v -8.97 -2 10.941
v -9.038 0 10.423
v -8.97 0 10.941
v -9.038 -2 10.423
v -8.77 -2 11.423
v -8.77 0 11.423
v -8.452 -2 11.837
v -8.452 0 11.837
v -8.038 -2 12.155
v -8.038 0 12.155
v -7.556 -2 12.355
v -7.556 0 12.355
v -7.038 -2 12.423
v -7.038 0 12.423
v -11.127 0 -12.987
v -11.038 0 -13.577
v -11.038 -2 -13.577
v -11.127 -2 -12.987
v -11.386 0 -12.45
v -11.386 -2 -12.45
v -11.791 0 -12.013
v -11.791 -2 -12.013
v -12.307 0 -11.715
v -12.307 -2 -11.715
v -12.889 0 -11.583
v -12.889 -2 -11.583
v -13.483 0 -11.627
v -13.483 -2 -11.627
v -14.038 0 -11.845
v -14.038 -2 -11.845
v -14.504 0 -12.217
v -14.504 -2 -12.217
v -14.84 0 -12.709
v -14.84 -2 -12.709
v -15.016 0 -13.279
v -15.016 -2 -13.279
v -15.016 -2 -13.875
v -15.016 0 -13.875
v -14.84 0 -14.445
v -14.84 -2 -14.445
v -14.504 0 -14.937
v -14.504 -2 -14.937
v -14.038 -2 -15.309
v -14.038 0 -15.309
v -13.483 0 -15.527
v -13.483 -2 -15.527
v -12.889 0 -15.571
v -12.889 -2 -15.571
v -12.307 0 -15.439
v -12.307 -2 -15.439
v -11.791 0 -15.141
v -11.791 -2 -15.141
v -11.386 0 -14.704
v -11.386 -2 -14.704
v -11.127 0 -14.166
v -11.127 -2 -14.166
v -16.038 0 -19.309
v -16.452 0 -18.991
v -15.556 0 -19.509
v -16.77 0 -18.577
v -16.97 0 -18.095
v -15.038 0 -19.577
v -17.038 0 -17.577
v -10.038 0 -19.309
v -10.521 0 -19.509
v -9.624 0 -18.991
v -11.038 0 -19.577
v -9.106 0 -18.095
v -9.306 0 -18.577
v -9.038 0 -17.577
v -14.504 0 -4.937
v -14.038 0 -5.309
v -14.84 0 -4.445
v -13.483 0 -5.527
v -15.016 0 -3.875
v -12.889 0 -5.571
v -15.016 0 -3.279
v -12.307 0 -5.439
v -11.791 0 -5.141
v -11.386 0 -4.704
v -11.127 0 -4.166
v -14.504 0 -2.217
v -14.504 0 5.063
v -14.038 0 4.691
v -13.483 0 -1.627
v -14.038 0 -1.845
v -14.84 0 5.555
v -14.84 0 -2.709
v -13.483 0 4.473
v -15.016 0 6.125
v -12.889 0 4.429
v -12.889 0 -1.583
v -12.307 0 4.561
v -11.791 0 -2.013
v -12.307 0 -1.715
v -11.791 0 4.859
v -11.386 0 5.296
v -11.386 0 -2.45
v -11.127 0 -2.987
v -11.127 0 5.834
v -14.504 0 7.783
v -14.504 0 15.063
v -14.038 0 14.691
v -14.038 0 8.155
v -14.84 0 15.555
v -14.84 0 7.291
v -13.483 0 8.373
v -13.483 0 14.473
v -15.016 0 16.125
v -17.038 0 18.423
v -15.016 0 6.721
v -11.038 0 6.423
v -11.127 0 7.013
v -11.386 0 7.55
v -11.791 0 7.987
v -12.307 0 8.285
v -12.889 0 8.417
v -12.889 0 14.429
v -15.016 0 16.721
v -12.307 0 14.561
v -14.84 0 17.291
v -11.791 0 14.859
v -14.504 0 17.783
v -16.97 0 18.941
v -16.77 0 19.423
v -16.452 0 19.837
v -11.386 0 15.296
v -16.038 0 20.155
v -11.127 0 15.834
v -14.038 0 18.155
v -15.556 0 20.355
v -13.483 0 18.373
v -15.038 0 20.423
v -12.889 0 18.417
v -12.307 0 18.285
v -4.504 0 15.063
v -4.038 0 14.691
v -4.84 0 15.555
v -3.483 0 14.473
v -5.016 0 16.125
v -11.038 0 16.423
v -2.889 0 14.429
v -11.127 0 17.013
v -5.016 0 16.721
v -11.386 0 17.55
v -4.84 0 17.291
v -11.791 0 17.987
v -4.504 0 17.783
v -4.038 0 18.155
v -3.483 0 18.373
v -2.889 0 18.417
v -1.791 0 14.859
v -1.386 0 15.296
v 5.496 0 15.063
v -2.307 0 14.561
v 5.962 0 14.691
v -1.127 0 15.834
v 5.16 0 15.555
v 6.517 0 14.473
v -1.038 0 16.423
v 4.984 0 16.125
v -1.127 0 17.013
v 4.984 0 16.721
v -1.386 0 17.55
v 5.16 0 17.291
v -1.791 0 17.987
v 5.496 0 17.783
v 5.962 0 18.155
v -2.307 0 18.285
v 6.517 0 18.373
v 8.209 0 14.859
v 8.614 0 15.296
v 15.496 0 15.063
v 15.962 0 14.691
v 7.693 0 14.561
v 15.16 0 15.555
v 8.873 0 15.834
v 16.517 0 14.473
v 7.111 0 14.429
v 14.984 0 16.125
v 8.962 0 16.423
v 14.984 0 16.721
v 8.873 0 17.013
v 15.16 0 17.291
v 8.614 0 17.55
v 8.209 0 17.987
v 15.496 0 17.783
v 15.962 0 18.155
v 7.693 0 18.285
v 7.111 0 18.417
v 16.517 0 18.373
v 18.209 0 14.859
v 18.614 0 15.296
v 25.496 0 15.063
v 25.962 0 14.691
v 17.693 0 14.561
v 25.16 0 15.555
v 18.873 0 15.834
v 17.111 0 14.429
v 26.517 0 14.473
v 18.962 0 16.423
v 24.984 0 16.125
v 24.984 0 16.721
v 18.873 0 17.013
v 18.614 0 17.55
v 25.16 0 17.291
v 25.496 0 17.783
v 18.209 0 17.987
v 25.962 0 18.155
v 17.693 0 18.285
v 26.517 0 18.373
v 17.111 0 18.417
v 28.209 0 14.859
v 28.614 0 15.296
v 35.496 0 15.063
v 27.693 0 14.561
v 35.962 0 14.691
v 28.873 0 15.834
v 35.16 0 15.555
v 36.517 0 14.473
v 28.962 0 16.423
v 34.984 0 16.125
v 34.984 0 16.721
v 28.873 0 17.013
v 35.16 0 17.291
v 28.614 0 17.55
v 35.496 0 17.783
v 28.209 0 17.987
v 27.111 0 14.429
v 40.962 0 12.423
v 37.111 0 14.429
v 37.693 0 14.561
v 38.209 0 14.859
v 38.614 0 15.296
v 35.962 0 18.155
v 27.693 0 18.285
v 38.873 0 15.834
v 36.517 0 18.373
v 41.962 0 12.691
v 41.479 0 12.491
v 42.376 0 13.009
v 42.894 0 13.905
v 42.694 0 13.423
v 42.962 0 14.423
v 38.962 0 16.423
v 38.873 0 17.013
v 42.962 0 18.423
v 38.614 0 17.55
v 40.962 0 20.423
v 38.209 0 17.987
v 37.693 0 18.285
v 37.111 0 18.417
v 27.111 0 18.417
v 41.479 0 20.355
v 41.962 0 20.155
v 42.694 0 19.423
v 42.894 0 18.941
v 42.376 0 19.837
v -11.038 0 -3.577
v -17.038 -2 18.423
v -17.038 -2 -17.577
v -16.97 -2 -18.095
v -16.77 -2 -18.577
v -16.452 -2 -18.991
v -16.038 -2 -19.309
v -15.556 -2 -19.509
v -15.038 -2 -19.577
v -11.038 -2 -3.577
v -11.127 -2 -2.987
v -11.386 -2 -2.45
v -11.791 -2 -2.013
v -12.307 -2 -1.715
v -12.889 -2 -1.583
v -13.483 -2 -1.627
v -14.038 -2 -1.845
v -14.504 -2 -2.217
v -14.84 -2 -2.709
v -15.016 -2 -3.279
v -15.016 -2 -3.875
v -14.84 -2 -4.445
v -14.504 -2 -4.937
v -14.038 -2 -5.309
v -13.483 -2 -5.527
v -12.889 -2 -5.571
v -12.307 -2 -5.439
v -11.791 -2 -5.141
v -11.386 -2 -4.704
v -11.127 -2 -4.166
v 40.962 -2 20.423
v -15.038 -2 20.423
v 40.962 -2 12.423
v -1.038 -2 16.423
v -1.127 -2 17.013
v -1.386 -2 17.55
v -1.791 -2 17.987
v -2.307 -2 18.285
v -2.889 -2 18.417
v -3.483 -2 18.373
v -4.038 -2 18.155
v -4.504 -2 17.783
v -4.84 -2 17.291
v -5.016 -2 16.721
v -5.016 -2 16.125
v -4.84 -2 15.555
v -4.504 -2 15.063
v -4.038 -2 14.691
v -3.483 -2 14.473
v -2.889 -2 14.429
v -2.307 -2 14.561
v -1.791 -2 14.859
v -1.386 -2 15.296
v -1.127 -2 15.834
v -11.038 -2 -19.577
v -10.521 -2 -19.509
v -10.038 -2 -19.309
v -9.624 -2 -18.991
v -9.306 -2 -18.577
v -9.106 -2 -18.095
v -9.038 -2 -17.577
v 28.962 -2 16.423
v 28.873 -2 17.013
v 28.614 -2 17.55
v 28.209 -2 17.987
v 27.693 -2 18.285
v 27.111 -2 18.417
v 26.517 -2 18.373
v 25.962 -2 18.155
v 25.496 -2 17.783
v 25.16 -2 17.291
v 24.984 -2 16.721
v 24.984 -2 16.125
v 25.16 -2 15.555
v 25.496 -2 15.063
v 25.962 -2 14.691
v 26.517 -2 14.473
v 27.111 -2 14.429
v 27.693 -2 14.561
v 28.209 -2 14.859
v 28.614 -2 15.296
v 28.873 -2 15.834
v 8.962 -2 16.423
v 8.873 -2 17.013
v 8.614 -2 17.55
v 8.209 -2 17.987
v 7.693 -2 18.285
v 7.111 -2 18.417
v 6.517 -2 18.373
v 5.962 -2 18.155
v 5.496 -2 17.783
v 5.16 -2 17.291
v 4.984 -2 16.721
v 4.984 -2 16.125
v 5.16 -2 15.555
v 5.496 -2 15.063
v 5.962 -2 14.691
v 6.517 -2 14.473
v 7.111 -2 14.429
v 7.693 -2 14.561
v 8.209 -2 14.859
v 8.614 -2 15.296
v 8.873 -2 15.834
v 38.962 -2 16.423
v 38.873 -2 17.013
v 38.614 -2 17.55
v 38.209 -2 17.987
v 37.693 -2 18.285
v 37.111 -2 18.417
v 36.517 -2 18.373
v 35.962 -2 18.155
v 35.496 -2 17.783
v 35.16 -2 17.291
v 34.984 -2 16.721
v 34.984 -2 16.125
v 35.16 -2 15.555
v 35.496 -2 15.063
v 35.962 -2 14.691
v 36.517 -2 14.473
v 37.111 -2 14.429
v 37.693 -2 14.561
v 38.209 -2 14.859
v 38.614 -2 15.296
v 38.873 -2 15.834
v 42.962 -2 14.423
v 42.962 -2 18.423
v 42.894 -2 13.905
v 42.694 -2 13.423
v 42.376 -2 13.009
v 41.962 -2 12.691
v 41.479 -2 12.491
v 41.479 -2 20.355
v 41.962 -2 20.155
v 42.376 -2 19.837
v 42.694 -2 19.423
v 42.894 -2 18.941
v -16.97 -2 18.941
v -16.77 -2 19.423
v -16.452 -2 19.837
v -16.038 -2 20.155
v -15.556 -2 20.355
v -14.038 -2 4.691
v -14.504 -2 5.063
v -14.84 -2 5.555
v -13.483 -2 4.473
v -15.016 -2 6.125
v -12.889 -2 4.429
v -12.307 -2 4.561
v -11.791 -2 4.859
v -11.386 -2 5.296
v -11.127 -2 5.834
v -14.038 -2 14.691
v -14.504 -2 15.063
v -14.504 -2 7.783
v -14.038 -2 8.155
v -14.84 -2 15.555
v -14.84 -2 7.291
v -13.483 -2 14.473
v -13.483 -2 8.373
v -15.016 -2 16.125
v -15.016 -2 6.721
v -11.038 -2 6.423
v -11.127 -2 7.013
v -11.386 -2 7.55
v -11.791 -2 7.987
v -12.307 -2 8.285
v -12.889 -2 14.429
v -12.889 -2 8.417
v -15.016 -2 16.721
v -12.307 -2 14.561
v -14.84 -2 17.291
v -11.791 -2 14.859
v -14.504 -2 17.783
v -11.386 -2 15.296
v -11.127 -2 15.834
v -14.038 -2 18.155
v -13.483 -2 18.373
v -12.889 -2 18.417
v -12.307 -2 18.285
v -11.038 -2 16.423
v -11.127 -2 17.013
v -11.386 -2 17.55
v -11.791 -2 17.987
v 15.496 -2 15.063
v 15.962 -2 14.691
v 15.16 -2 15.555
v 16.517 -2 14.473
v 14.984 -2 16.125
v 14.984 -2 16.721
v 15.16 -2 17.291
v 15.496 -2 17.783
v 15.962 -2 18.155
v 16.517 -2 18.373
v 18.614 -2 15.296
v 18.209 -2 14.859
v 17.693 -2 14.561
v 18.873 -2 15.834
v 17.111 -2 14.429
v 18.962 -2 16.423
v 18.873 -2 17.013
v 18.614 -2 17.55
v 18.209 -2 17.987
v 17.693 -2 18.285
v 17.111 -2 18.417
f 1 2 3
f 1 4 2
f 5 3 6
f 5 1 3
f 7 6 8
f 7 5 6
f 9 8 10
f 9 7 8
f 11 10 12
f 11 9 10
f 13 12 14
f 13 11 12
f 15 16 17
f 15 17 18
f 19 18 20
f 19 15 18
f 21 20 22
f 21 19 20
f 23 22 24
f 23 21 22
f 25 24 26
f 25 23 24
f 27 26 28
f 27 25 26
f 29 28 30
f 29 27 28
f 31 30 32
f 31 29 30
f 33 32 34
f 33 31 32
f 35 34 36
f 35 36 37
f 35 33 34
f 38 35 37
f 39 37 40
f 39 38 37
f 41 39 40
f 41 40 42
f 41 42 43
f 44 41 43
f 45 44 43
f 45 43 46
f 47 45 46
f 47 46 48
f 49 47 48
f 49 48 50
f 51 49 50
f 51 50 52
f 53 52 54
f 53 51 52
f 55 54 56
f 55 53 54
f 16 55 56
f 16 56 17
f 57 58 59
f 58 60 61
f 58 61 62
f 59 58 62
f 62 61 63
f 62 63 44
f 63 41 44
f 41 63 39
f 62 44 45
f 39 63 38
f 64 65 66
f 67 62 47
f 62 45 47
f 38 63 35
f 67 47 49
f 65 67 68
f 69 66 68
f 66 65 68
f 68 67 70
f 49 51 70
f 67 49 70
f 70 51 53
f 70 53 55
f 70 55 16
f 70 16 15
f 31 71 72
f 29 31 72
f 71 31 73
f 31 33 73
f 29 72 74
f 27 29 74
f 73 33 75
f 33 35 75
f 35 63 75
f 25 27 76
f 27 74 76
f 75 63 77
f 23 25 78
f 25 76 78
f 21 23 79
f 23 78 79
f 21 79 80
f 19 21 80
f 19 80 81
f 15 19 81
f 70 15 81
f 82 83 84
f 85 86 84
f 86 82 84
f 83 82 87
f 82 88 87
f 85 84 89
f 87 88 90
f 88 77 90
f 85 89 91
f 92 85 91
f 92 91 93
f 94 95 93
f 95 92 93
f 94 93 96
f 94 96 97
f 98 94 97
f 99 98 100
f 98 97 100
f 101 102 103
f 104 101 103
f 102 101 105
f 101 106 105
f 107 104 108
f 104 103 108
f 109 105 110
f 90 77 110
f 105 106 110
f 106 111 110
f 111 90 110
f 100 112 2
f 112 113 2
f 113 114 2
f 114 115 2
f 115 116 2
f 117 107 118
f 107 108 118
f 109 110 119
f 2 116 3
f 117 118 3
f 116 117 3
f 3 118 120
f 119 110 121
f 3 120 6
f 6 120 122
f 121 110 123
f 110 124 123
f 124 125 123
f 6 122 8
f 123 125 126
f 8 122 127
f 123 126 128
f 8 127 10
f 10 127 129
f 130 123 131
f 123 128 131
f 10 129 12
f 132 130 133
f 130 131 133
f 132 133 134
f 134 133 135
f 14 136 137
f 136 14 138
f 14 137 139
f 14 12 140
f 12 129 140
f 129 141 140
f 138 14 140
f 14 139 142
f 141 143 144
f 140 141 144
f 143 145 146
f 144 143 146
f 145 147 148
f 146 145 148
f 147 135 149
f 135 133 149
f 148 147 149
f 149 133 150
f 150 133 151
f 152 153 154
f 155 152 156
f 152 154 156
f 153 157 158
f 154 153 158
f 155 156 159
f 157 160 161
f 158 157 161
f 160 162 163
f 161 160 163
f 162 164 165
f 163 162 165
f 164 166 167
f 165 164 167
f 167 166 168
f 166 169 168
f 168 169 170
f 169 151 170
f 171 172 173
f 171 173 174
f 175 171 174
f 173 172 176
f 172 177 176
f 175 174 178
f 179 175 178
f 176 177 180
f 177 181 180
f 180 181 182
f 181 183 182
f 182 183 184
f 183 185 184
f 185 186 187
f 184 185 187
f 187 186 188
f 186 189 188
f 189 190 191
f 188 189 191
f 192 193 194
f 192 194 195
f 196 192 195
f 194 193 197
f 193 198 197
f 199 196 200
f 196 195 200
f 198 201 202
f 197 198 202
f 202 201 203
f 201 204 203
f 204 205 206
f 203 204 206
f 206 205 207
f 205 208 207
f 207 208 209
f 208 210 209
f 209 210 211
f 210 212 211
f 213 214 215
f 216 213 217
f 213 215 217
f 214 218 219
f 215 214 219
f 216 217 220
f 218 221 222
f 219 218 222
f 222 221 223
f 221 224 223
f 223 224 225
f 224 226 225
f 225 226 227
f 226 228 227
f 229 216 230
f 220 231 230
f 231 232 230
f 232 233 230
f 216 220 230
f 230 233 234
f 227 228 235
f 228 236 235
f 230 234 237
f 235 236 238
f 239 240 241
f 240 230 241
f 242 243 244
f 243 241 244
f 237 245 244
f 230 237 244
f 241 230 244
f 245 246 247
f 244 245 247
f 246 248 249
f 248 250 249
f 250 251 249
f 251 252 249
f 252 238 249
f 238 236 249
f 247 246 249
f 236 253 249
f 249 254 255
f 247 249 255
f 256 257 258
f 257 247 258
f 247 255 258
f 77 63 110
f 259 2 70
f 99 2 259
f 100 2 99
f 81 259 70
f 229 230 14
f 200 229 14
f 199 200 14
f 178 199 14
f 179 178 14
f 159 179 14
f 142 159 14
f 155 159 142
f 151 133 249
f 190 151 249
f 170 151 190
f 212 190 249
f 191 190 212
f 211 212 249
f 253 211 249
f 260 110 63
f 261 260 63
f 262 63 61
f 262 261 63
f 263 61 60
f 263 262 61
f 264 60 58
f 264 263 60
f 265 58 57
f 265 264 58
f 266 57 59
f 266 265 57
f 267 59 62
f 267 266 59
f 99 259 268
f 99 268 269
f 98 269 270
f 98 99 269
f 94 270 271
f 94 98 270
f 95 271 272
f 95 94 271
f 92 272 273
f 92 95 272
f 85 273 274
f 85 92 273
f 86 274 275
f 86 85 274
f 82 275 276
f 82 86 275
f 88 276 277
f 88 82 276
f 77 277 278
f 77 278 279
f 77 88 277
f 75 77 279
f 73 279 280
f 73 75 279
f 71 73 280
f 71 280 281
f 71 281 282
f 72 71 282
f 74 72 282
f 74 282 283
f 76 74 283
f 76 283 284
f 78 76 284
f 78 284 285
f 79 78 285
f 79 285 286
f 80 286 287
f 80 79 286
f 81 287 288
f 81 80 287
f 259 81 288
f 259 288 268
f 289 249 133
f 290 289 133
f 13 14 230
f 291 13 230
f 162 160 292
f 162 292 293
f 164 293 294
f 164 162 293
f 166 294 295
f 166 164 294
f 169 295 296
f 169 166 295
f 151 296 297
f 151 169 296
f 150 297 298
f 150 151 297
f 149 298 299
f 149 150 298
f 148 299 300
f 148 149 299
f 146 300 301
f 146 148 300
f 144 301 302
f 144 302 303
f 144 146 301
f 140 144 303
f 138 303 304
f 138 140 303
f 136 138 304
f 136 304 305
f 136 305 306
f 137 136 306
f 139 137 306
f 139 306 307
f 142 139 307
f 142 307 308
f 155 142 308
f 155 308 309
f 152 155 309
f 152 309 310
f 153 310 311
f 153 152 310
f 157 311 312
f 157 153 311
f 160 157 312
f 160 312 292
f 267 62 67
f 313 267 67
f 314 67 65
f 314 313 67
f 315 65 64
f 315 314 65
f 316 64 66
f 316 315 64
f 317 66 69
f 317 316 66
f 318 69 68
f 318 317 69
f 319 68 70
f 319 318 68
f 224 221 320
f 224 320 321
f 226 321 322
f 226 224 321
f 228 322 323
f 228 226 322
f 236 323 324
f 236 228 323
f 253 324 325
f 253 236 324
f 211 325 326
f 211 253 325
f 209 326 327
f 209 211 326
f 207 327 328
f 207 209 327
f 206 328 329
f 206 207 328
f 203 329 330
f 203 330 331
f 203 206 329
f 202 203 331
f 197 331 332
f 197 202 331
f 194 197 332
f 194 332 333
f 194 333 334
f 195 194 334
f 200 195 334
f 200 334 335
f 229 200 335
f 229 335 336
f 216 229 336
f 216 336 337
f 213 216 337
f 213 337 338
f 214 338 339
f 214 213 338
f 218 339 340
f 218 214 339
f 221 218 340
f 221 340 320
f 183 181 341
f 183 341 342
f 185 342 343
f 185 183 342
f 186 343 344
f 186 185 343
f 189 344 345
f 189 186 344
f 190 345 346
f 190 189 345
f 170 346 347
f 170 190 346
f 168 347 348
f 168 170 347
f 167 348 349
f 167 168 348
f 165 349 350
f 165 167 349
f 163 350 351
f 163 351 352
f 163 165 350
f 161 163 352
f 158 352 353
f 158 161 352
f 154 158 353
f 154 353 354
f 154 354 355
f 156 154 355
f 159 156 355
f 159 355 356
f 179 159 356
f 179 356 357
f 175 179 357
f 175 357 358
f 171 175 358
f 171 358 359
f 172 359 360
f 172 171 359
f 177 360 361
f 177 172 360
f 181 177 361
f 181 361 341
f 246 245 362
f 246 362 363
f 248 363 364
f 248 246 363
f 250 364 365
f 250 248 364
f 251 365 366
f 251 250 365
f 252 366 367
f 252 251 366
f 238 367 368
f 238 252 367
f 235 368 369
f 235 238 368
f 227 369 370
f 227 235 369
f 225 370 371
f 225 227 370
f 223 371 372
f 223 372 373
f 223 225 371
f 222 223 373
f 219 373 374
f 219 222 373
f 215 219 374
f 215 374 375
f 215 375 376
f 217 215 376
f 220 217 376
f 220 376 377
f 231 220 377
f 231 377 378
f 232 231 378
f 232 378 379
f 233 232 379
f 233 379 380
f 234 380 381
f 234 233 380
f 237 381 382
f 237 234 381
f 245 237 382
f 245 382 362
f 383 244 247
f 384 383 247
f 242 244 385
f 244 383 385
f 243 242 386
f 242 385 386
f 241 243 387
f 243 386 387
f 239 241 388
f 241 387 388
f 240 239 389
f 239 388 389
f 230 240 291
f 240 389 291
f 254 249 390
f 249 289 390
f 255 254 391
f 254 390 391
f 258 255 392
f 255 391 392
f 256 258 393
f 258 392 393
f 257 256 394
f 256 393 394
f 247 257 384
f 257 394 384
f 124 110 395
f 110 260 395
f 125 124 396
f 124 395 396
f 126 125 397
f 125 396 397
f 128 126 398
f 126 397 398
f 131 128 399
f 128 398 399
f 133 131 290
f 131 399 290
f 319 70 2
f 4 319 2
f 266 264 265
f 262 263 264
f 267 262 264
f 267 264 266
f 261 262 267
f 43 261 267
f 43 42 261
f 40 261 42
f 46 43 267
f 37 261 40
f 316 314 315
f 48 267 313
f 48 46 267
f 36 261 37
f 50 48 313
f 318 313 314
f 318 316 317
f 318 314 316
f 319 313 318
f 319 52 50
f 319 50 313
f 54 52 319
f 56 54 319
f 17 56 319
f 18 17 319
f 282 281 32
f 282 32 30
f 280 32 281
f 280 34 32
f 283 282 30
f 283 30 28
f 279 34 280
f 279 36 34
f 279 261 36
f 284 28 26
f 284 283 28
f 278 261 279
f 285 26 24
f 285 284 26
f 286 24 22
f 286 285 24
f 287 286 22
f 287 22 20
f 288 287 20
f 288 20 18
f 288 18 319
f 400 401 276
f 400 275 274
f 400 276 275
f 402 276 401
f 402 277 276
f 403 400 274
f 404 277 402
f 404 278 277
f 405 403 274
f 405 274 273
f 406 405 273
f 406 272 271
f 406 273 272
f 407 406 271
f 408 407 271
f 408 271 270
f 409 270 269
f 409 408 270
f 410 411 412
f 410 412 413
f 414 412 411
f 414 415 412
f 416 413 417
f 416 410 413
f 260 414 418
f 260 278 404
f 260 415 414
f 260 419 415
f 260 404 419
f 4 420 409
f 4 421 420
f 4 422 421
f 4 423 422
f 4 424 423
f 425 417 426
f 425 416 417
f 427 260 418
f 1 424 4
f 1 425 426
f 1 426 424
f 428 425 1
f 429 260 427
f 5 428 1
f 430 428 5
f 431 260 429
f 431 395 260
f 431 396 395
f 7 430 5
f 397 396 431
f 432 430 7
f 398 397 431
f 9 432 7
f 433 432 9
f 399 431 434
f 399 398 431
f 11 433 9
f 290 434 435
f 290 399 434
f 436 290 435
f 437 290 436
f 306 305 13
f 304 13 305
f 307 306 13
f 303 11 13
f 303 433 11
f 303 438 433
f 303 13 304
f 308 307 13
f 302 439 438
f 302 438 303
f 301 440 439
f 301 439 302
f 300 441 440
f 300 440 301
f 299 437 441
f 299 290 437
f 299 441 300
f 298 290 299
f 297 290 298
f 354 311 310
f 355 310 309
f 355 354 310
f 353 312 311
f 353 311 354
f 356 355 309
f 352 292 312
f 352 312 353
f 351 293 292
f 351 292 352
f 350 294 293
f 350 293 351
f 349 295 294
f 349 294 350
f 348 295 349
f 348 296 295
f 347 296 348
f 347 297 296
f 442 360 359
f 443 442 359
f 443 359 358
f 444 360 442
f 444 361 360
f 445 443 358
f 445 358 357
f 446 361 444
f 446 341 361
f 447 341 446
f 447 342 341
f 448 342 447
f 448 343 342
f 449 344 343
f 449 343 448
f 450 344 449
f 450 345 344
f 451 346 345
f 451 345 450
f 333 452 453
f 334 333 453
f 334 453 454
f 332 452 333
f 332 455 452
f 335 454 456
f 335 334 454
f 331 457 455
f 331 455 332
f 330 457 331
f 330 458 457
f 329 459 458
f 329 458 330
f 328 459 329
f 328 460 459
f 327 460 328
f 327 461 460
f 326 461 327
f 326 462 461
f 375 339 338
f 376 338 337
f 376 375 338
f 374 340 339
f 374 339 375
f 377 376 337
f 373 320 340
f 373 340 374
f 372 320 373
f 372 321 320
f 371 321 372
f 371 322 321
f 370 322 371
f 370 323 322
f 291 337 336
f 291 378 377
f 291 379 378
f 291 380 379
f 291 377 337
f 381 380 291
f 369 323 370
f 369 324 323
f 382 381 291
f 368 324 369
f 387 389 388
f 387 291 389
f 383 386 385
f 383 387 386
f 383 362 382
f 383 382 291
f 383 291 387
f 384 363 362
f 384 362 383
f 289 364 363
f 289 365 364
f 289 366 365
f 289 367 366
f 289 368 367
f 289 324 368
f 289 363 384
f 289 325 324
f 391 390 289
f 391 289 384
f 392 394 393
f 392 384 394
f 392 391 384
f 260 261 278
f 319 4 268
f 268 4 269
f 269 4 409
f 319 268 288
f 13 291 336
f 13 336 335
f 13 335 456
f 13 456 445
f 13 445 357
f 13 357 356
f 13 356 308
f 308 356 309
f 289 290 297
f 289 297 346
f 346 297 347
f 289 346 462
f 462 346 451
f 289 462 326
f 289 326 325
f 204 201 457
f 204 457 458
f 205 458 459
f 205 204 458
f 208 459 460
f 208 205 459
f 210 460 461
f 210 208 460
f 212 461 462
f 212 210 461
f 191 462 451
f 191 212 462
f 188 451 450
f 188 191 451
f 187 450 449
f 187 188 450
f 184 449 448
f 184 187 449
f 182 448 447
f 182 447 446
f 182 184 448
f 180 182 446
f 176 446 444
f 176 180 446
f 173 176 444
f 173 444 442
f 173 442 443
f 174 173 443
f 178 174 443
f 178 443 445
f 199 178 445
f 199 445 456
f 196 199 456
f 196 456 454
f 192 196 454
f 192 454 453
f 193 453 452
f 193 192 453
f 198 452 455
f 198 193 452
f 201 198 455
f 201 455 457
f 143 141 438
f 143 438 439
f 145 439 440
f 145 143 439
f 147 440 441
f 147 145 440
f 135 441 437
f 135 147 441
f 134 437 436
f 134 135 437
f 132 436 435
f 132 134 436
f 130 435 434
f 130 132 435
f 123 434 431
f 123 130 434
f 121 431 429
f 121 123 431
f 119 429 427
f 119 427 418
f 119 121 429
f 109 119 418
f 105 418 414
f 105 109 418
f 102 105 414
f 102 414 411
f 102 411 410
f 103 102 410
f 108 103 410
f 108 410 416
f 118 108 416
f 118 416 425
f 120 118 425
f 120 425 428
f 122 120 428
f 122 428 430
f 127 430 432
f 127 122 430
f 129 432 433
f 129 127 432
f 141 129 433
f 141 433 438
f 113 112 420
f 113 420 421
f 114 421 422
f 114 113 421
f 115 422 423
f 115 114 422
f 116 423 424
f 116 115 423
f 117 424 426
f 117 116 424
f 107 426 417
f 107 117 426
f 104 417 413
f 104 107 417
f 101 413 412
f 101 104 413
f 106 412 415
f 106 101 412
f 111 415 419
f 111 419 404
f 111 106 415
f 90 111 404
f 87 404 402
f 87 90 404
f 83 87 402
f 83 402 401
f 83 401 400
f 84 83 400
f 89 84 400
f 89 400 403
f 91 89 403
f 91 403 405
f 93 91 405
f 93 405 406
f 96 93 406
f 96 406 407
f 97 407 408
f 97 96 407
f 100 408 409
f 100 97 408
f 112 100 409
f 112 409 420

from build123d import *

# Parameters (mm, degrees)
F0_R     = 2
F1_DEPTH = 2
F2_R     = 2


with BuildPart() as f1:
    # F0 (on Front) → F1 (new body)
    with BuildSketch(Plane.XZ):
        Polygon((-17.038149, 20.423017), (-17.038149, -19.576983), (-9.038149, -19.576983), (-9.038149, 12.423017), (42.961851, 12.423017), (42.961851, 20.423017), align=None)
        with Locations((-13.038149, -13.576983)):
            Circle(F0_R, mode=Mode.SUBTRACT)
        with Locations((-13.038149, -3.576983)):
            Circle(F0_R, mode=Mode.SUBTRACT)
        with Locations((-13.038149, 6.423017)):
            Circle(F0_R, mode=Mode.SUBTRACT)
        with Locations((-13.038149, 16.423017)):
            Circle(F0_R, mode=Mode.SUBTRACT)
        with Locations((-3.038149, 16.423017)):
            Circle(F0_R, mode=Mode.SUBTRACT)
        with Locations((6.961851, 16.423017)):
            Circle(F0_R, mode=Mode.SUBTRACT)
        with Locations((16.961851, 16.423017)):
            Circle(F0_R, mode=Mode.SUBTRACT)
        with Locations((26.961851, 16.423017)):
            Circle(F0_R, mode=Mode.SUBTRACT)
        with Locations((36.961851, 16.423017)):
            Circle(F0_R, mode=Mode.SUBTRACT)
    extrude(amount=F1_DEPTH)

    # F2
    f2_edges = [f1.edges().sort_by_distance(p)[0] for p in [
        (-17.038149, -1, 20.423017),
        (42.961851, -1, 20.423017),
        (42.961851, -1, 12.423017),
        (-9.038149, -1, 12.423017),
        (-9.038149, -1, -19.576983),
        (-17.038149, -1, -19.576983),
    ]]
    fillet(f2_edges, radius=F2_R)


solid = f1.part
